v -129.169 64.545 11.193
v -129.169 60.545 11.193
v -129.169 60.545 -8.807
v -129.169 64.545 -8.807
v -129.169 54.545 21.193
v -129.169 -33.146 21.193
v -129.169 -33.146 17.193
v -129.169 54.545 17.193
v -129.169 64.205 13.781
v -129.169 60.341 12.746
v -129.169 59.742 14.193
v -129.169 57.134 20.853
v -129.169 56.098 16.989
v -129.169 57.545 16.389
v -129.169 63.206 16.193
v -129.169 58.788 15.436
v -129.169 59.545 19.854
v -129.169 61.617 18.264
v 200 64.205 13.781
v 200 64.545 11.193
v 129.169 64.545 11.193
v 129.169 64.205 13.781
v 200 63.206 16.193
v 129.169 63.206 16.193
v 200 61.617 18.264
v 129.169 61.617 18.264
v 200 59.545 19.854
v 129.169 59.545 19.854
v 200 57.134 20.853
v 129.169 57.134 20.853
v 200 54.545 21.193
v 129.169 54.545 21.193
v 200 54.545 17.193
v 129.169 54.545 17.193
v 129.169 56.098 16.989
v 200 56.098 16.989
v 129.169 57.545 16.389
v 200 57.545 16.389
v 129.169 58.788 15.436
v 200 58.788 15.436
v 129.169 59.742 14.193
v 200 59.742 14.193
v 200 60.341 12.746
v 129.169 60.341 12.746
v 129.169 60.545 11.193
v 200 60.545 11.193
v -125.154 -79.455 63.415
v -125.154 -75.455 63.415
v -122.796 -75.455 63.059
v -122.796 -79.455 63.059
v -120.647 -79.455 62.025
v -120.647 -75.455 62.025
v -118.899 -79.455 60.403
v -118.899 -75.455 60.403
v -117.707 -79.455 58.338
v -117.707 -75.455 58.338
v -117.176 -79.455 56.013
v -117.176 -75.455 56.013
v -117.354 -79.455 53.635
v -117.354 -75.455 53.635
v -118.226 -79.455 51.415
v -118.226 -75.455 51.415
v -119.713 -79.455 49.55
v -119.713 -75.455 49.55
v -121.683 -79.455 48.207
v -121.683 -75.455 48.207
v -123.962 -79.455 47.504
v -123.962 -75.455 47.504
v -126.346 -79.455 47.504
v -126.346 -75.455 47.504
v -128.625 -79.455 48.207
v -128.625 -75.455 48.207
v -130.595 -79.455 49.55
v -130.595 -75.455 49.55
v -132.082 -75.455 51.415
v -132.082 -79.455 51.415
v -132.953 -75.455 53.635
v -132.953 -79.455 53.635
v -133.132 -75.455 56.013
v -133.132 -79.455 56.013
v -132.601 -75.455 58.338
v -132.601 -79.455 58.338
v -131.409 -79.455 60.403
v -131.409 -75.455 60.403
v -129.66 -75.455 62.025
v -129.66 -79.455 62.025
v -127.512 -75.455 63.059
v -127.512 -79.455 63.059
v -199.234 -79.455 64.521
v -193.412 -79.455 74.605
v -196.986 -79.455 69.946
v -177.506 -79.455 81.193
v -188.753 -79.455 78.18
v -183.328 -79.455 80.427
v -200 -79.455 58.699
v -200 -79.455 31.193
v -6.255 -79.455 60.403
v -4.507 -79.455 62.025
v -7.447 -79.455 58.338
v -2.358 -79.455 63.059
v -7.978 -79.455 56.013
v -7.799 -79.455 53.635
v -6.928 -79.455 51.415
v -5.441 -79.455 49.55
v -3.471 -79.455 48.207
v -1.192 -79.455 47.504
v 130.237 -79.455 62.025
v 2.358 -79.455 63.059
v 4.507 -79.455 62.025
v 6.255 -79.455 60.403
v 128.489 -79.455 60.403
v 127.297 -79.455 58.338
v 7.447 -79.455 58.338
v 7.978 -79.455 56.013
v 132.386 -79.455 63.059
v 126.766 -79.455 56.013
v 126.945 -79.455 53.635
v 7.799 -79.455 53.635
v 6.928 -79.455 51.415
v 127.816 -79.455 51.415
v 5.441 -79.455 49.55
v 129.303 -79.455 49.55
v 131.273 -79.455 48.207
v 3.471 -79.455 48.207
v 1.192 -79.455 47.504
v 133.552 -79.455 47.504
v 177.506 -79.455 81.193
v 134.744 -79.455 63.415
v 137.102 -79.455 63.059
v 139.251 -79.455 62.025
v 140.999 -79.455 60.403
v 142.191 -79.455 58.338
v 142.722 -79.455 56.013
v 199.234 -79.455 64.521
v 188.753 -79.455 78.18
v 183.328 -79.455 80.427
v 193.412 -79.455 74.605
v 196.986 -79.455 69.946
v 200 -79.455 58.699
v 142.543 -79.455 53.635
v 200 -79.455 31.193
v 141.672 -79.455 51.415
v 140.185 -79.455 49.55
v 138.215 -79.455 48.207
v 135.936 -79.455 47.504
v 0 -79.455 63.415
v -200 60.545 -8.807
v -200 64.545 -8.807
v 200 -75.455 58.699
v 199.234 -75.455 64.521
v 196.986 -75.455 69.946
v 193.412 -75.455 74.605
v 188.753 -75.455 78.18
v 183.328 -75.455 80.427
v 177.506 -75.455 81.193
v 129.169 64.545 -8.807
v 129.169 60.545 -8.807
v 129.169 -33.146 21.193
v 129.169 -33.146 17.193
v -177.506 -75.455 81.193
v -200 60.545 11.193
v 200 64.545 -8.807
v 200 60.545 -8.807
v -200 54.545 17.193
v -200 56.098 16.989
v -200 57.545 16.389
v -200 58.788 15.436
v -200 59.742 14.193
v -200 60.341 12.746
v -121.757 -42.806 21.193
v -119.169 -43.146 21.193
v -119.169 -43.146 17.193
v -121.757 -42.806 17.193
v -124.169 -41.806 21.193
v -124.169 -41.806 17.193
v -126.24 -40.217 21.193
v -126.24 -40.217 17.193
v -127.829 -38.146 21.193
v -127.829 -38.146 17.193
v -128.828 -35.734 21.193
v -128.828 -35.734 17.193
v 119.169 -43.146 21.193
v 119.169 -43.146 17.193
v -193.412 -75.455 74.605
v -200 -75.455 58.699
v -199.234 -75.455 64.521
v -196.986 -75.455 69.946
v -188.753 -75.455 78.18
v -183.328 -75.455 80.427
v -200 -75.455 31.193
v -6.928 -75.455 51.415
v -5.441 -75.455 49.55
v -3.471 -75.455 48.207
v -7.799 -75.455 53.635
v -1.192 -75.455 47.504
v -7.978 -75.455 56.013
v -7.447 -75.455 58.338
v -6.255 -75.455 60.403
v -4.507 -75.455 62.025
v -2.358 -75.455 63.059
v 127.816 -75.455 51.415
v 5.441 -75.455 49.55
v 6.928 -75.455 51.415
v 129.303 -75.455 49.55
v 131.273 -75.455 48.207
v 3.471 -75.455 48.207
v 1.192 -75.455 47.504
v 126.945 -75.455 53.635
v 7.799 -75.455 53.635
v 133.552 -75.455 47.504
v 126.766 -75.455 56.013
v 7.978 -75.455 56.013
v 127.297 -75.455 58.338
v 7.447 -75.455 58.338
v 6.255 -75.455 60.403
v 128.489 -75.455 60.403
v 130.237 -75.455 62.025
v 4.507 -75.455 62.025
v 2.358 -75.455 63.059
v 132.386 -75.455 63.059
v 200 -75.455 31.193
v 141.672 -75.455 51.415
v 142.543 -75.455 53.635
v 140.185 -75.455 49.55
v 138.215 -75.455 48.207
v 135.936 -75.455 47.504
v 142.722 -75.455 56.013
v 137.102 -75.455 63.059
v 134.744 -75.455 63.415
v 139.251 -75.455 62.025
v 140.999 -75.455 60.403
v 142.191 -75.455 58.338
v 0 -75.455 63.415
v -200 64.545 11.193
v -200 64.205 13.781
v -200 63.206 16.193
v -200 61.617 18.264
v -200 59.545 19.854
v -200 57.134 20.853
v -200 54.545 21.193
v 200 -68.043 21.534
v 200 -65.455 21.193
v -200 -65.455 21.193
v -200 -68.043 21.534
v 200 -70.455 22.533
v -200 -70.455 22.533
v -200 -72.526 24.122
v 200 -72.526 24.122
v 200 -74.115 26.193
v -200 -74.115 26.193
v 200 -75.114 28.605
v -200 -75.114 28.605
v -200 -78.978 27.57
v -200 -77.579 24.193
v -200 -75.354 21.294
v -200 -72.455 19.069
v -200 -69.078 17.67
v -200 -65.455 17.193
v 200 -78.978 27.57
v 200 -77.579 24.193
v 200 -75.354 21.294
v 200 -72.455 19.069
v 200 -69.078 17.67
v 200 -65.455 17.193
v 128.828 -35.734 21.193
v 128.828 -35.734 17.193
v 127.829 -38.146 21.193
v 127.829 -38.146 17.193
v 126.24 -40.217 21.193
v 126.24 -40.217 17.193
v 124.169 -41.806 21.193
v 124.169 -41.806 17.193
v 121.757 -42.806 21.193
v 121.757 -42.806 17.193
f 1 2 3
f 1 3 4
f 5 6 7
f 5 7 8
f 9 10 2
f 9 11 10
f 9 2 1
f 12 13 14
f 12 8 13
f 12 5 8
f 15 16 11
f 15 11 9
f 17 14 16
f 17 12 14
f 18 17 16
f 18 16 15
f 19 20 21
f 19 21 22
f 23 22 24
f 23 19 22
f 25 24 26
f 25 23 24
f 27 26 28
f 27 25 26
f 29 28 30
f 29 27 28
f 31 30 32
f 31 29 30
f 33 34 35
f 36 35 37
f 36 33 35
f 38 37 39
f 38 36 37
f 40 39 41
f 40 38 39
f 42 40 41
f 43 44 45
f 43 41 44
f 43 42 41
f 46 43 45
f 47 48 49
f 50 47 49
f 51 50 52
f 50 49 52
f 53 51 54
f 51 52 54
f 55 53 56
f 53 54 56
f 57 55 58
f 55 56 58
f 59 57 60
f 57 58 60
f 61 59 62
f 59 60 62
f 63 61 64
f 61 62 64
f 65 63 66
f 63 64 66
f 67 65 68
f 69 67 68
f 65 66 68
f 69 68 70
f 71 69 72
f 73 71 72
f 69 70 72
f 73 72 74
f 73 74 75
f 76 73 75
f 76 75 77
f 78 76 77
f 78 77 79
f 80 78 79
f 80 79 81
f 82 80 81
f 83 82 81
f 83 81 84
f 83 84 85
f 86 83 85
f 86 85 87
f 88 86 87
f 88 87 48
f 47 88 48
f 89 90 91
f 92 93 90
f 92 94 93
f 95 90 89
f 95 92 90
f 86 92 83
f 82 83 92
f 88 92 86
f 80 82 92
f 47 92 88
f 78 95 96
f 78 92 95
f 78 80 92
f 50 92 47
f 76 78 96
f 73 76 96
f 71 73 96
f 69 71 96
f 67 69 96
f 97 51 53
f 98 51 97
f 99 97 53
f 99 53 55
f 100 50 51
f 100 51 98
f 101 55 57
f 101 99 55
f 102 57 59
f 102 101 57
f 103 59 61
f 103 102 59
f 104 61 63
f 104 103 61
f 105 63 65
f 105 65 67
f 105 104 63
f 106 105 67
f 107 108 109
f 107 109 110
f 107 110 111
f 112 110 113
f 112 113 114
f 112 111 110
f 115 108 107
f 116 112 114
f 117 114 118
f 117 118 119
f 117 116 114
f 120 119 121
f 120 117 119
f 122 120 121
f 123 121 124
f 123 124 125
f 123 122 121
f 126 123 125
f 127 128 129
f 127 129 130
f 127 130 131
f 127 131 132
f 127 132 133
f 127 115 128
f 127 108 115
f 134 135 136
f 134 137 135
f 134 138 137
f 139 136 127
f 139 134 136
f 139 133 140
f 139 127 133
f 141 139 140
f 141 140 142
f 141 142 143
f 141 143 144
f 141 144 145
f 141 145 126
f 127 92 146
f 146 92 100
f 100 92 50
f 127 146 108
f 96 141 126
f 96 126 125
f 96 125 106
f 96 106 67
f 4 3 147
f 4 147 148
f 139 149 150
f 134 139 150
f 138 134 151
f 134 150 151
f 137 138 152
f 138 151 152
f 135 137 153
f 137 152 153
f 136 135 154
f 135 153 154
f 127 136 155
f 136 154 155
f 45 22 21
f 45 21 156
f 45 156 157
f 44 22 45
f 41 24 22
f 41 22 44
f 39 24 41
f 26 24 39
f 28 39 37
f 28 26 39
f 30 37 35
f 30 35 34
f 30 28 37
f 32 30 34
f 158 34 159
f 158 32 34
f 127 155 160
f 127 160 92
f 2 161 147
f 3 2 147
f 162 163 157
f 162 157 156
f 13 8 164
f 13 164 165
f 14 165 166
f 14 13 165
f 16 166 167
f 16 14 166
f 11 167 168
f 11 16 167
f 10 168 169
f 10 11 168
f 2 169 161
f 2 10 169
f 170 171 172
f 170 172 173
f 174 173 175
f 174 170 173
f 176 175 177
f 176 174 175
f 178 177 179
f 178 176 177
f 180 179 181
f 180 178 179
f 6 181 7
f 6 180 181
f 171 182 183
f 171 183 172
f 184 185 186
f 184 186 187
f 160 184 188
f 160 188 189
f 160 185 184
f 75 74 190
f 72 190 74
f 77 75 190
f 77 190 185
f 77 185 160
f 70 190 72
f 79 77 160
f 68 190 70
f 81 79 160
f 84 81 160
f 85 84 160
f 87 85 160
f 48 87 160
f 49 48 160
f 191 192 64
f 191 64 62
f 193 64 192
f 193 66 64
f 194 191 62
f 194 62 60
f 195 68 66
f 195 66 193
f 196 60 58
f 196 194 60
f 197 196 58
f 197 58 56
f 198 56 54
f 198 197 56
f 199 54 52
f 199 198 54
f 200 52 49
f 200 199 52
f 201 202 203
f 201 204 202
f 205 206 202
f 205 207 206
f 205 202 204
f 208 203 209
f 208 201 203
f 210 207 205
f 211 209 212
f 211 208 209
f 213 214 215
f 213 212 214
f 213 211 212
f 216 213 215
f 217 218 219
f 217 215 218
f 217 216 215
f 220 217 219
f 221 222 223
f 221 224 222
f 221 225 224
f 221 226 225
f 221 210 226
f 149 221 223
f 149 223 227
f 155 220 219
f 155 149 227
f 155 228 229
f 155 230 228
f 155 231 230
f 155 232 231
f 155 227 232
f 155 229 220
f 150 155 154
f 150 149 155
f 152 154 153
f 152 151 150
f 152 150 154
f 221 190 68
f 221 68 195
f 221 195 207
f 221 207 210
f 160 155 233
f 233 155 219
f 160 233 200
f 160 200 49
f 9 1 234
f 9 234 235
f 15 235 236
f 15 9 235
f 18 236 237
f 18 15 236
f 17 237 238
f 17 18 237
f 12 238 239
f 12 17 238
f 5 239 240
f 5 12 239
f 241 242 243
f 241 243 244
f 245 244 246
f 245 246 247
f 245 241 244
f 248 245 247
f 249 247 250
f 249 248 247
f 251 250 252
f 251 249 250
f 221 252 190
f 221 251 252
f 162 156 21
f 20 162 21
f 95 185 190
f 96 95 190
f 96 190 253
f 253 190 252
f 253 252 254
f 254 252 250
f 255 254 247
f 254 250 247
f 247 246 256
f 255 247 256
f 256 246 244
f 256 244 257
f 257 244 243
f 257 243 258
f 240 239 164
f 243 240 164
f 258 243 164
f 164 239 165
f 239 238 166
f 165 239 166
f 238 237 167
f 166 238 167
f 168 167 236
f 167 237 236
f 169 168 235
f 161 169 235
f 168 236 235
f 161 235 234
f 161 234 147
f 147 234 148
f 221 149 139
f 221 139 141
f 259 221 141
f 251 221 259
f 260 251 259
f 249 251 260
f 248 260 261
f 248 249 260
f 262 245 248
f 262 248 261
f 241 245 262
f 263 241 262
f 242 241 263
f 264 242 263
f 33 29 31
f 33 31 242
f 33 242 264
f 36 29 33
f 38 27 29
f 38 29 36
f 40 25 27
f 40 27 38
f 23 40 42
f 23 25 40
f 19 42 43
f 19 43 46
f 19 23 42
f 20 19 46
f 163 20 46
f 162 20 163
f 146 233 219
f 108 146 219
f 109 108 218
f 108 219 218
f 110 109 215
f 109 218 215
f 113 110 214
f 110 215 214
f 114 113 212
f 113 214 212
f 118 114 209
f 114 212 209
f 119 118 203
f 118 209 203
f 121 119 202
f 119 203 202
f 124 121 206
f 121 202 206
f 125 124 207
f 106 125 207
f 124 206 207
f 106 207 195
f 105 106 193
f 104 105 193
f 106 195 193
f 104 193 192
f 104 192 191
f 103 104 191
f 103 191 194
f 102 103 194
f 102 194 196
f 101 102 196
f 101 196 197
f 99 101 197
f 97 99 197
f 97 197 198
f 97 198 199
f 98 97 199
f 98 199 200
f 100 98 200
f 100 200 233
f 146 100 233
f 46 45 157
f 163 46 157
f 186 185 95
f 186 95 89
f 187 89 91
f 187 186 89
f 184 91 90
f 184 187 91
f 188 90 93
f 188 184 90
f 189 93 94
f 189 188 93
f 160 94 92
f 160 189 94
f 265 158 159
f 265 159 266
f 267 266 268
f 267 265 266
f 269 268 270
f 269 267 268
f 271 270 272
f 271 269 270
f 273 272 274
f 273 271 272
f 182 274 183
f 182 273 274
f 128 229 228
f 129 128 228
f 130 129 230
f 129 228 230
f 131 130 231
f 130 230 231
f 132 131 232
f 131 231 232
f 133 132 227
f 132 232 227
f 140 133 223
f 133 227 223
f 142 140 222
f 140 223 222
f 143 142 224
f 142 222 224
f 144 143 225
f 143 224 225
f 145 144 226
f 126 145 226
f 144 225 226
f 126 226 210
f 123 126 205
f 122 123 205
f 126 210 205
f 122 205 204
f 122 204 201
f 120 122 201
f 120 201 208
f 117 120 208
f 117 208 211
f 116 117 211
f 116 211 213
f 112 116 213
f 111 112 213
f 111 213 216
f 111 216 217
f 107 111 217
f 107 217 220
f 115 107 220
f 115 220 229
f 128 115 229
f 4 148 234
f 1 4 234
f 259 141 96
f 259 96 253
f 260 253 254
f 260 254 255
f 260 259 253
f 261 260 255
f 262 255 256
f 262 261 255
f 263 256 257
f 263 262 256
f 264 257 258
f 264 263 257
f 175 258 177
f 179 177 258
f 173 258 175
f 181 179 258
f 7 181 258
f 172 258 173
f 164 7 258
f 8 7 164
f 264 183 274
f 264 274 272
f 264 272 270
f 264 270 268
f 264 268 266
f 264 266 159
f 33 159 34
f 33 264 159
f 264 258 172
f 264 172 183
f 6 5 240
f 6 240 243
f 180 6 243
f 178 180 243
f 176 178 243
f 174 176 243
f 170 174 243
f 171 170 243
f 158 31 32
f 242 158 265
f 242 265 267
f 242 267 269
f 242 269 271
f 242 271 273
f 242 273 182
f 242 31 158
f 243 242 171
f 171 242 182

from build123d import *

# Parameters (mm, degrees)
BOSS_EXTRUDE1_DEPTH = 100
SKETCH2_R           = 4
CUT_EXTRUDE1_DEPTH  = 200
CUT_EXTRUDE2_DEPTH  = 200
SCALE1_SCALE        = 2


with BuildPart() as part:
    # Sketch1 → Boss-Extrude1 (new, symmetric)
    with BuildSketch(Plane(origin=(0, 0, 0), x_dir=(0, 0, -1), z_dir=(1, 0, 0))):
        with BuildLine():
            Line((4.403376918, 32.272727273), (-5.596623082, 32.272727273))
            ThreePointArc((-5.596623082, 32.272727273), (-9.132156988, 30.808261179), (-10.596623082, 27.272727273))
            Line((-10.596623082, 27.272727273), (-10.596623082, -32.727272727))
            ThreePointArc((-10.596623082, -32.727272727), (-12.061089177, -36.262806633), (-15.596623082, -37.727272727))
            Line((-15.596623082, -37.727272727), (-40.596623082, -37.727272727))
            Line((-40.596623082, -37.727272727), (-40.596623082, -39.727272727))
            Line((-40.596623082, -39.727272727), (-15.596623082, -39.727272727))
            ThreePointArc((-15.596623082, -39.727272727), (-10.646875614, -37.677020196), (-8.596623082, -32.727272727))
            Line((-8.596623082, -32.727272727), (-8.596623082, 27.272727273))
            ThreePointArc((-8.596623082, 27.272727273), (-7.717943426, 29.394047616), (-5.596623082, 30.272727273))
            Line((-5.596623082, 30.272727273), (4.403376918, 30.272727273))
            Line((4.403376918, 30.272727273), (4.403376918, 32.272727273))
        make_face()
    extrude(amount=BOSS_EXTRUDE1_DEPTH, both=True)

    # Sketch2 → Cut-Extrude1 (cut)
    with BuildSketch(Plane(origin=(0, 32.272727273, 0), x_dir=(1, 0, 0), z_dir=(0, 1, 0))):
        with Locations(Location((0, -27.707416892, 0), (0, 0, 270))):
            Circle(SKETCH2_R)
        with Locations(Location((-62.576946362, -27.707416892, 0), (0, 0, 270))):
            Circle(SKETCH2_R)
        with Locations(Location((67.371990144, -27.707416892, 0), (0, 0, 270))):
            Circle(SKETCH2_R)
        with BuildLine():
            Line((-88.753028946, -40.596623082), (-100, -40.596623082))
            Line((-100, -40.596623082), (-100, -29.349652028))
            ThreePointArc((-100, -29.349652028), (-96.705838446, -37.302461529), (-88.753028946, -40.596623082))
        make_face()
        with BuildLine():
            Line((100, -40.596623082), (100, -29.349652028))
            ThreePointArc((100, -29.349652028), (96.705838446, -37.302461529), (88.753028946, -40.596623082))
            Line((88.753028946, -40.596623082), (100, -40.596623082))
        make_face()
    extrude(amount=-CUT_EXTRUDE1_DEPTH, mode=Mode.SUBTRACT)

    # Sketch3 → Cut-Extrude2 (cut)
    with BuildSketch(Plane.XY.offset(10.596623082)):
        with BuildLine():
            Line((-64.584534402, 178.454407754), (64.584534402, 178.454407754))
            Line((64.584534402, 178.454407754), (64.584534402, -16.573121652))
            ThreePointArc((64.584534402, -16.573121652), (63.120068308, -20.108655558), (59.584534402, -21.573121652))
            Line((59.584534402, -21.573121652), (-59.584534402, -21.573121652))
            ThreePointArc((-59.584534402, -21.573121652), (-63.120068308, -20.108655558), (-64.584534402, -16.573121652))
            Line((-64.584534402, -16.573121652), (-64.584534402, 178.454407754))
        make_face()
    extrude(amount=-CUT_EXTRUDE2_DEPTH, mode=Mode.SUBTRACT)


with BuildPart() as part_1:
    # Scale1: scaled about (0, 0, 0)
    add(part.part.scale(SCALE1_SCALE))


solid = part_1.part
